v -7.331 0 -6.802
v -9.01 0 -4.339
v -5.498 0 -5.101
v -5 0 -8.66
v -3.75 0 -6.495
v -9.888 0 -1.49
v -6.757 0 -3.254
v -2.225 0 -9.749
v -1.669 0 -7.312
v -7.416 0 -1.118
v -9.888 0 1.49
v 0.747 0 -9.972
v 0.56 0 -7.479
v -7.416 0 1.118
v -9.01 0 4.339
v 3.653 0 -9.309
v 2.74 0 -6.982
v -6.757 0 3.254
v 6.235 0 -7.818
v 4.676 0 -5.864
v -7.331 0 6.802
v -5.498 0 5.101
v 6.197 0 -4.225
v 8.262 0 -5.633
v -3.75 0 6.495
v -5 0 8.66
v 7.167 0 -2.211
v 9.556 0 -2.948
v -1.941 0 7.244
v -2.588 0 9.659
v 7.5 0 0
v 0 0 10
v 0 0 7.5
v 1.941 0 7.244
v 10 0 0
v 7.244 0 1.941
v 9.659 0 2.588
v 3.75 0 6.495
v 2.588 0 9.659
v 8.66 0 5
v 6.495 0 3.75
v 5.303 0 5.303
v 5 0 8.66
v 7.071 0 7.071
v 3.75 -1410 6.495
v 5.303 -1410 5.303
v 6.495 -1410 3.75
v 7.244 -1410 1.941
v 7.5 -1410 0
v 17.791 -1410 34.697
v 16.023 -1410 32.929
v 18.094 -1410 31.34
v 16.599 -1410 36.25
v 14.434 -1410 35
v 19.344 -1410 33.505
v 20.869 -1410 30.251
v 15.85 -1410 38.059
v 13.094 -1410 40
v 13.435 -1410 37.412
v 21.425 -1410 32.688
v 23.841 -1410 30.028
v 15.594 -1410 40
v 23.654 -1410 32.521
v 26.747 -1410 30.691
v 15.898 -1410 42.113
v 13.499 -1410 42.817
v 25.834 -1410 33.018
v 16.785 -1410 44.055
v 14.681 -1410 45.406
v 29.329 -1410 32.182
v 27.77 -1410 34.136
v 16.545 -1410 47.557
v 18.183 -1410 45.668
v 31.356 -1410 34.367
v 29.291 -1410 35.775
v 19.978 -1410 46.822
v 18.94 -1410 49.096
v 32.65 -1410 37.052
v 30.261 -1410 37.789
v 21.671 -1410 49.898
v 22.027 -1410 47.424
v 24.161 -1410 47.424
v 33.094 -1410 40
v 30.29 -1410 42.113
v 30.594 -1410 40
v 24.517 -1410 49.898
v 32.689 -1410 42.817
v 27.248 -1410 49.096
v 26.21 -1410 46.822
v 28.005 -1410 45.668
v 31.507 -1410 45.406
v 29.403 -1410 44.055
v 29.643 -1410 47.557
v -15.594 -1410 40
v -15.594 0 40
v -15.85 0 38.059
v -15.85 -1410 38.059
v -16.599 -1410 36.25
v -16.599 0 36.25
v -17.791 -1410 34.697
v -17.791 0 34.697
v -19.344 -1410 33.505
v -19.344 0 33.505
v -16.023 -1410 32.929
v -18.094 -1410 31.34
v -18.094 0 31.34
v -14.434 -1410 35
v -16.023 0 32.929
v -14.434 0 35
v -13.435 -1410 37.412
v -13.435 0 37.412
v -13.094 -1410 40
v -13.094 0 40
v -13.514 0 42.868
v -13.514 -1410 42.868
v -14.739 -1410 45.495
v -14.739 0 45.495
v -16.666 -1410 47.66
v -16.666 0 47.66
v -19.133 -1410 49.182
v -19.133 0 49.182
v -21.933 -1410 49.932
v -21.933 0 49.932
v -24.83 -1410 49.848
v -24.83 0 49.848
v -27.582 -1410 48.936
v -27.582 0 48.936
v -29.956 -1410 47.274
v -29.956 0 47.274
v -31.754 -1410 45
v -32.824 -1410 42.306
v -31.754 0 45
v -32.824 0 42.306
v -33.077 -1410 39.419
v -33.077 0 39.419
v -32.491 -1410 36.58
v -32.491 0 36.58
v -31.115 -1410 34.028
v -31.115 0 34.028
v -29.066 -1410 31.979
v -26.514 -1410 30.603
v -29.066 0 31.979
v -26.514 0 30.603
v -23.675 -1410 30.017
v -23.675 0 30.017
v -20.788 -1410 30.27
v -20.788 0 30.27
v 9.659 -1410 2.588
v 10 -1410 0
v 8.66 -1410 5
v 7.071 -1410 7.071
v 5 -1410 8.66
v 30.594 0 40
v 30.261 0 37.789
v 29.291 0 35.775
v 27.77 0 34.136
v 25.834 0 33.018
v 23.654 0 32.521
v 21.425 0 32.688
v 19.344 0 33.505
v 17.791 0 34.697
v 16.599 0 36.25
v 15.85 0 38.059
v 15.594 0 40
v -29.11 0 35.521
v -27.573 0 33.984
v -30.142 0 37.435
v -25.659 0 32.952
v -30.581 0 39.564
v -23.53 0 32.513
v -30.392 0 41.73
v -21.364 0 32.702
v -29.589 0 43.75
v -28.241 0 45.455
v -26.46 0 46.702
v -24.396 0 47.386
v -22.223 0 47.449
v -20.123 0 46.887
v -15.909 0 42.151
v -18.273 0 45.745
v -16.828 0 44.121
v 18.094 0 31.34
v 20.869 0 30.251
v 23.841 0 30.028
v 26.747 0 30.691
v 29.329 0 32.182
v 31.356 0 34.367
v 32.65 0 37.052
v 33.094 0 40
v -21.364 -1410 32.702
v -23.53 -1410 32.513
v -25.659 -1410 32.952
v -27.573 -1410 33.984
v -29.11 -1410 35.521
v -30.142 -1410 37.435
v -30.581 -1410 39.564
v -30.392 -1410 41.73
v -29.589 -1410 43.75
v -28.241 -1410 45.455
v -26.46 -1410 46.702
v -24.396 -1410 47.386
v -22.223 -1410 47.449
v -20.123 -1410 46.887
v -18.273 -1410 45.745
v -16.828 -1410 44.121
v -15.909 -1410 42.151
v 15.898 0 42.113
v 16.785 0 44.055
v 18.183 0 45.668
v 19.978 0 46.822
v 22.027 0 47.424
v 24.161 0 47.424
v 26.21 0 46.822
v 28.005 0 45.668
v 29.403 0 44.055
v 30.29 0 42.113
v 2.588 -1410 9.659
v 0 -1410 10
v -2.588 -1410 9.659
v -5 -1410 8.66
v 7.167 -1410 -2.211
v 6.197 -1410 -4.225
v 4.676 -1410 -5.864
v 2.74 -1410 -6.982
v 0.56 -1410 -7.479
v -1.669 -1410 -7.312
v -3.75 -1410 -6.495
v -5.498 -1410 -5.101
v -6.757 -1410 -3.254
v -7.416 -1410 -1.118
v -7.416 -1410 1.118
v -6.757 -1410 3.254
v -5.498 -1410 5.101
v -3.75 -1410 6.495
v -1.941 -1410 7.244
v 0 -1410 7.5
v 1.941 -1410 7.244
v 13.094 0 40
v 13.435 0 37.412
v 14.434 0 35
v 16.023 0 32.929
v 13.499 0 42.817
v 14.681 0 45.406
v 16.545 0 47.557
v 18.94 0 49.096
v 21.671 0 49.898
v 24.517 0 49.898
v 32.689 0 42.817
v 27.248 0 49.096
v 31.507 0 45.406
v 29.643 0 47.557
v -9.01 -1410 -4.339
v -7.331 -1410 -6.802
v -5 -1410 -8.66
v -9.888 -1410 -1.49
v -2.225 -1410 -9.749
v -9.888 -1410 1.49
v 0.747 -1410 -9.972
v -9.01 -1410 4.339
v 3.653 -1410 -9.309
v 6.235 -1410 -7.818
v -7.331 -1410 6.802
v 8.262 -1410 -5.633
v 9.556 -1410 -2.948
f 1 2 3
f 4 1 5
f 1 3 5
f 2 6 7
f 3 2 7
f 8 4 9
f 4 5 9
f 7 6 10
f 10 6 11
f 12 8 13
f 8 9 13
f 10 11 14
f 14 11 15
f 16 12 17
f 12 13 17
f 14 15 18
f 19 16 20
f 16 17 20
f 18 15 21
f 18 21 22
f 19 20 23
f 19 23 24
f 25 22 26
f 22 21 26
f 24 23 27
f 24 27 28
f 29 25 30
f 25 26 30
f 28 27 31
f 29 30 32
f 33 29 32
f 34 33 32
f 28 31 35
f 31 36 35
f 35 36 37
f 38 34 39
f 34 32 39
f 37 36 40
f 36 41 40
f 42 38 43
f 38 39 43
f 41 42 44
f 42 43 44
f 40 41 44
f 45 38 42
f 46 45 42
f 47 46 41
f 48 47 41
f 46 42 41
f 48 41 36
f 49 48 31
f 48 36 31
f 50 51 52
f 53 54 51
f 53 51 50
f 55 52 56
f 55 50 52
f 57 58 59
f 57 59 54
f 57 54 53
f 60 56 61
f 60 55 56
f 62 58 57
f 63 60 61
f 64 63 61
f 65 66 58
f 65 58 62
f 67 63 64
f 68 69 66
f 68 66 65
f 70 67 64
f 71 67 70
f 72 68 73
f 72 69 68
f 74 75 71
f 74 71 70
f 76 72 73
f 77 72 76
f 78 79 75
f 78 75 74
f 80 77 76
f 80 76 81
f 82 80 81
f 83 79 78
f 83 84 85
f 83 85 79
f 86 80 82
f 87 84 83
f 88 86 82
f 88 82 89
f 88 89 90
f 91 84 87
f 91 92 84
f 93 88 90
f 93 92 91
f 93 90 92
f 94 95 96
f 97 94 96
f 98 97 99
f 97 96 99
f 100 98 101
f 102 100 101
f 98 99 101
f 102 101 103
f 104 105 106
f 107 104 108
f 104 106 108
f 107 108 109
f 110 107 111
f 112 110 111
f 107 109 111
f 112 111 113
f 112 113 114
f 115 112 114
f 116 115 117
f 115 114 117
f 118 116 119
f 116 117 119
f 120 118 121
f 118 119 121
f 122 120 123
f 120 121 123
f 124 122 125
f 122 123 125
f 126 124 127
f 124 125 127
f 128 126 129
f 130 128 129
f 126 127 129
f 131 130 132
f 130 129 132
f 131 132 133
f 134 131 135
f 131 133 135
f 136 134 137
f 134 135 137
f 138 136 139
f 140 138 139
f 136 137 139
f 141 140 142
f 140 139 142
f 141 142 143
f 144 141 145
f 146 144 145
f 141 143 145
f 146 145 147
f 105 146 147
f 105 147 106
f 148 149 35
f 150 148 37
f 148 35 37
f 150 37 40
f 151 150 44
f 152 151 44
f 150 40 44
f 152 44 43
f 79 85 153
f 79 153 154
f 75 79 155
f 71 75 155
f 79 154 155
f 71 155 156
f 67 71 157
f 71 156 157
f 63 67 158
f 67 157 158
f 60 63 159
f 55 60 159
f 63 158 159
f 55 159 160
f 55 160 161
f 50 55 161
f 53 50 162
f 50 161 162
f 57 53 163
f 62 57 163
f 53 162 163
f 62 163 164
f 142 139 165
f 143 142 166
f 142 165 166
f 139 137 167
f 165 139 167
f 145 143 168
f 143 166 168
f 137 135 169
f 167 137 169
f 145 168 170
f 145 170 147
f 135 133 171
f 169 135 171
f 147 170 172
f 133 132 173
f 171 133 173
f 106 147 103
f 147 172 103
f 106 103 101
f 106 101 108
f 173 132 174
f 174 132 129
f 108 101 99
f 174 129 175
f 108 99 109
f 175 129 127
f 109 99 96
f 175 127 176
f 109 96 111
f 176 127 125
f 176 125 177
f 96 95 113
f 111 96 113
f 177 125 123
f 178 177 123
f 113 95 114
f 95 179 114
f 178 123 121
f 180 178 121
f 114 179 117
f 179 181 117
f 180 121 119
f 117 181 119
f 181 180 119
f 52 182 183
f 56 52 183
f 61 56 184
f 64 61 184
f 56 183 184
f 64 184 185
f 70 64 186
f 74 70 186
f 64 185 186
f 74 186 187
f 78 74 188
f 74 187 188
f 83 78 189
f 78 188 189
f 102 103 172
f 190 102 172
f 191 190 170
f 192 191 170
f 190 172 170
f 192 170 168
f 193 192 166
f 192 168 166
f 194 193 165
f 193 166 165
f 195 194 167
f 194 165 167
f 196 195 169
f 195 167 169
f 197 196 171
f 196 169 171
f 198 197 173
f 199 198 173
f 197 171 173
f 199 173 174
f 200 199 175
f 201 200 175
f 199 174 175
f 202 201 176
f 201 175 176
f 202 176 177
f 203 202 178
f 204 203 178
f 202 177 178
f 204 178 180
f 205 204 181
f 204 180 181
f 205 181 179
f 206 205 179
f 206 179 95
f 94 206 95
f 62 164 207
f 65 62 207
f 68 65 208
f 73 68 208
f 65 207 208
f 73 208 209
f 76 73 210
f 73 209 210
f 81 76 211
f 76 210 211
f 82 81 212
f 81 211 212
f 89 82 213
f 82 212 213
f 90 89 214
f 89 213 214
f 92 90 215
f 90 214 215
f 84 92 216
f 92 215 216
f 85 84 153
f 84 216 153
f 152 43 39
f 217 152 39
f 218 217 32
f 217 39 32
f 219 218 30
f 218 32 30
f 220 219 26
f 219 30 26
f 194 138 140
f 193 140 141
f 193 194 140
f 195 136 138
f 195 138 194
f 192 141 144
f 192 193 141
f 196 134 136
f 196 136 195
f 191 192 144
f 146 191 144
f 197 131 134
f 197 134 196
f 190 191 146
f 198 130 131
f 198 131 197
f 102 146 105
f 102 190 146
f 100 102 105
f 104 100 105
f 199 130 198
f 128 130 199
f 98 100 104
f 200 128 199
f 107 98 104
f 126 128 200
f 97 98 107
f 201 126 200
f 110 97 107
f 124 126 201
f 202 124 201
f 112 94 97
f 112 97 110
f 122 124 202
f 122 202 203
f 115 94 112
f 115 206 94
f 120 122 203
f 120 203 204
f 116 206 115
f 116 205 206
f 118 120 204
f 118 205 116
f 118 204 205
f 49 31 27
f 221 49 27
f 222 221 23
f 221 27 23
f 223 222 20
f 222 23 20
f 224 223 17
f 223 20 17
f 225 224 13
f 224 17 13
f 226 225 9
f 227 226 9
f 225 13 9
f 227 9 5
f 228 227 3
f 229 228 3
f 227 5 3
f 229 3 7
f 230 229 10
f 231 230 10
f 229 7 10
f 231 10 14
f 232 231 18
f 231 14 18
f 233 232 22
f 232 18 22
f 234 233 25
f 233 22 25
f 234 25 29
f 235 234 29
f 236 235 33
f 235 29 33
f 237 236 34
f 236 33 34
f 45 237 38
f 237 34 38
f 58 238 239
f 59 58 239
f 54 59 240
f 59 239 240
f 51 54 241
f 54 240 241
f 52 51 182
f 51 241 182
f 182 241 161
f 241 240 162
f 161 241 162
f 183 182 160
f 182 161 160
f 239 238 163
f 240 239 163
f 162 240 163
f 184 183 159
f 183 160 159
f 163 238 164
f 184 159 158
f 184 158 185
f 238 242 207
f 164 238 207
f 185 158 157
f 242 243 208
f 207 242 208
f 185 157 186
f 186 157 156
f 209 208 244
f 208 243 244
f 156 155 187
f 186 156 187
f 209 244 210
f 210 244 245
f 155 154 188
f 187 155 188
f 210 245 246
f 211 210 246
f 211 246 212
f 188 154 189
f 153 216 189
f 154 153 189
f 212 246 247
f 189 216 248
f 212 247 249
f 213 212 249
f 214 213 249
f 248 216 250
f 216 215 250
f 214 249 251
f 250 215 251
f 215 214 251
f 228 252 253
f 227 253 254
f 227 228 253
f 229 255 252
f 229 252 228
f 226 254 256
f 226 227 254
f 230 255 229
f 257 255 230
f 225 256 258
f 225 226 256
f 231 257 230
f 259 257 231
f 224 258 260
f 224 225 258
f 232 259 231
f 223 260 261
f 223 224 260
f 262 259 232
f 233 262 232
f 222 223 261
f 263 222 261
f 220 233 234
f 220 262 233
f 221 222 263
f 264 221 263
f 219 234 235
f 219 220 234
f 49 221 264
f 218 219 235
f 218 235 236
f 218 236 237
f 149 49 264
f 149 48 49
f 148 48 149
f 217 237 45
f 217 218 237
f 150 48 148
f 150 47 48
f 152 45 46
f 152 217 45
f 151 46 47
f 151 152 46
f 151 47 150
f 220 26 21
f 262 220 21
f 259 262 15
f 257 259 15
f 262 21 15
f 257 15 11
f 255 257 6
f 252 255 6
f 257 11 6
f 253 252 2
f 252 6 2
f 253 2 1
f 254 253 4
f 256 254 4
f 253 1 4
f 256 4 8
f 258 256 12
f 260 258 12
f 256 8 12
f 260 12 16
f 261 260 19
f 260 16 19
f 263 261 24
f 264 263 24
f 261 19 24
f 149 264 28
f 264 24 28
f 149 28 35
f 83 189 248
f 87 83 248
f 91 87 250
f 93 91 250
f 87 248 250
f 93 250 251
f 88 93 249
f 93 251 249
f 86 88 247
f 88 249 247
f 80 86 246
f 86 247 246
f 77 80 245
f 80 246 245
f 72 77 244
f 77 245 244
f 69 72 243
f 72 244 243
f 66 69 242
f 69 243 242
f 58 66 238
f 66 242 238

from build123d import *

# Parameters (mm, degrees)
F1_DEPTH = 1410


with BuildPart() as f1:
    # F0 (on Front) → F1 (new body)
    with BuildSketch(Plane.XZ):
        with BuildLine():
            Line((-19.344011, 33.504809), (-18.094011, 31.339746))
            ThreePointArc((-18.094011, 31.339746), (-14.433757, 35), (-13.094011, 40))
            Line((-13.094011, 40), (-15.594011, 40))
            ThreePointArc((-15.594011, 40), (-16.59882, 36.25), (-19.344011, 33.504809))
        make_face()
        with BuildLine():
            ThreePointArc((-13.094011, 40), (-31.754265, 45), (-18.094011, 31.339746))
            Line((-18.094011, 31.339746), (-19.344011, 33.504809))
            ThreePointArc((-19.344011, 33.504809), (-29.589201, 43.75), (-15.594011, 40))
            Line((-15.594011, 40), (-13.094011, 40))
        make_face()
        with BuildLine():
            ThreePointArc((13.094011, 40), (14.433757, 35), (18.094011, 31.339746))
            Line((18.094011, 31.339746), (19.344011, 33.504809))
            ThreePointArc((19.344011, 33.504809), (16.59882, 36.25), (15.594011, 40))
            Line((15.594011, 40), (13.094011, 40))
        make_face()
        with BuildLine():
            Line((19.344011, 33.504809), (18.094011, 31.339746))
            ThreePointArc((18.094011, 31.339746), (28.094011, 31.339746), (33.094011, 40))
            ThreePointArc((33.094011, 40), (23.094011, 50), (13.094011, 40))
            Line((13.094011, 40), (15.594011, 40))
            ThreePointArc((15.594011, 40), (23.094011, 47.5), (30.594011, 40))
            ThreePointArc((30.594011, 40), (26.844011, 33.504809), (19.344011, 33.504809))
        make_face()
        with BuildLine():
            ThreePointArc((-5, 8.660254), (-5, -8.660254), (10, 0))
            ThreePointArc((10, 0), (8.660254, 5), (5, 8.660254))
            Line((5, 8.660254), (3.75, 6.495191))
            ThreePointArc((3.75, 6.495191), (6.495191, 3.75), (7.5, 0))
            ThreePointArc((7.5, 0), (-3.75, -6.495191), (-3.75, 6.495191))
            Line((-3.75, 6.495191), (-5, 8.660254))
        make_face()
        with BuildLine():
            Line((3.75, 6.495191), (5, 8.660254))
            ThreePointArc((5, 8.660254), (0, 10), (-5, 8.660254))
            Line((-5, 8.660254), (-3.75, 6.495191))
            ThreePointArc((-3.75, 6.495191), (0, 7.5), (3.75, 6.495191))
        make_face()
    extrude(amount=F1_DEPTH)


solid = f1.part
